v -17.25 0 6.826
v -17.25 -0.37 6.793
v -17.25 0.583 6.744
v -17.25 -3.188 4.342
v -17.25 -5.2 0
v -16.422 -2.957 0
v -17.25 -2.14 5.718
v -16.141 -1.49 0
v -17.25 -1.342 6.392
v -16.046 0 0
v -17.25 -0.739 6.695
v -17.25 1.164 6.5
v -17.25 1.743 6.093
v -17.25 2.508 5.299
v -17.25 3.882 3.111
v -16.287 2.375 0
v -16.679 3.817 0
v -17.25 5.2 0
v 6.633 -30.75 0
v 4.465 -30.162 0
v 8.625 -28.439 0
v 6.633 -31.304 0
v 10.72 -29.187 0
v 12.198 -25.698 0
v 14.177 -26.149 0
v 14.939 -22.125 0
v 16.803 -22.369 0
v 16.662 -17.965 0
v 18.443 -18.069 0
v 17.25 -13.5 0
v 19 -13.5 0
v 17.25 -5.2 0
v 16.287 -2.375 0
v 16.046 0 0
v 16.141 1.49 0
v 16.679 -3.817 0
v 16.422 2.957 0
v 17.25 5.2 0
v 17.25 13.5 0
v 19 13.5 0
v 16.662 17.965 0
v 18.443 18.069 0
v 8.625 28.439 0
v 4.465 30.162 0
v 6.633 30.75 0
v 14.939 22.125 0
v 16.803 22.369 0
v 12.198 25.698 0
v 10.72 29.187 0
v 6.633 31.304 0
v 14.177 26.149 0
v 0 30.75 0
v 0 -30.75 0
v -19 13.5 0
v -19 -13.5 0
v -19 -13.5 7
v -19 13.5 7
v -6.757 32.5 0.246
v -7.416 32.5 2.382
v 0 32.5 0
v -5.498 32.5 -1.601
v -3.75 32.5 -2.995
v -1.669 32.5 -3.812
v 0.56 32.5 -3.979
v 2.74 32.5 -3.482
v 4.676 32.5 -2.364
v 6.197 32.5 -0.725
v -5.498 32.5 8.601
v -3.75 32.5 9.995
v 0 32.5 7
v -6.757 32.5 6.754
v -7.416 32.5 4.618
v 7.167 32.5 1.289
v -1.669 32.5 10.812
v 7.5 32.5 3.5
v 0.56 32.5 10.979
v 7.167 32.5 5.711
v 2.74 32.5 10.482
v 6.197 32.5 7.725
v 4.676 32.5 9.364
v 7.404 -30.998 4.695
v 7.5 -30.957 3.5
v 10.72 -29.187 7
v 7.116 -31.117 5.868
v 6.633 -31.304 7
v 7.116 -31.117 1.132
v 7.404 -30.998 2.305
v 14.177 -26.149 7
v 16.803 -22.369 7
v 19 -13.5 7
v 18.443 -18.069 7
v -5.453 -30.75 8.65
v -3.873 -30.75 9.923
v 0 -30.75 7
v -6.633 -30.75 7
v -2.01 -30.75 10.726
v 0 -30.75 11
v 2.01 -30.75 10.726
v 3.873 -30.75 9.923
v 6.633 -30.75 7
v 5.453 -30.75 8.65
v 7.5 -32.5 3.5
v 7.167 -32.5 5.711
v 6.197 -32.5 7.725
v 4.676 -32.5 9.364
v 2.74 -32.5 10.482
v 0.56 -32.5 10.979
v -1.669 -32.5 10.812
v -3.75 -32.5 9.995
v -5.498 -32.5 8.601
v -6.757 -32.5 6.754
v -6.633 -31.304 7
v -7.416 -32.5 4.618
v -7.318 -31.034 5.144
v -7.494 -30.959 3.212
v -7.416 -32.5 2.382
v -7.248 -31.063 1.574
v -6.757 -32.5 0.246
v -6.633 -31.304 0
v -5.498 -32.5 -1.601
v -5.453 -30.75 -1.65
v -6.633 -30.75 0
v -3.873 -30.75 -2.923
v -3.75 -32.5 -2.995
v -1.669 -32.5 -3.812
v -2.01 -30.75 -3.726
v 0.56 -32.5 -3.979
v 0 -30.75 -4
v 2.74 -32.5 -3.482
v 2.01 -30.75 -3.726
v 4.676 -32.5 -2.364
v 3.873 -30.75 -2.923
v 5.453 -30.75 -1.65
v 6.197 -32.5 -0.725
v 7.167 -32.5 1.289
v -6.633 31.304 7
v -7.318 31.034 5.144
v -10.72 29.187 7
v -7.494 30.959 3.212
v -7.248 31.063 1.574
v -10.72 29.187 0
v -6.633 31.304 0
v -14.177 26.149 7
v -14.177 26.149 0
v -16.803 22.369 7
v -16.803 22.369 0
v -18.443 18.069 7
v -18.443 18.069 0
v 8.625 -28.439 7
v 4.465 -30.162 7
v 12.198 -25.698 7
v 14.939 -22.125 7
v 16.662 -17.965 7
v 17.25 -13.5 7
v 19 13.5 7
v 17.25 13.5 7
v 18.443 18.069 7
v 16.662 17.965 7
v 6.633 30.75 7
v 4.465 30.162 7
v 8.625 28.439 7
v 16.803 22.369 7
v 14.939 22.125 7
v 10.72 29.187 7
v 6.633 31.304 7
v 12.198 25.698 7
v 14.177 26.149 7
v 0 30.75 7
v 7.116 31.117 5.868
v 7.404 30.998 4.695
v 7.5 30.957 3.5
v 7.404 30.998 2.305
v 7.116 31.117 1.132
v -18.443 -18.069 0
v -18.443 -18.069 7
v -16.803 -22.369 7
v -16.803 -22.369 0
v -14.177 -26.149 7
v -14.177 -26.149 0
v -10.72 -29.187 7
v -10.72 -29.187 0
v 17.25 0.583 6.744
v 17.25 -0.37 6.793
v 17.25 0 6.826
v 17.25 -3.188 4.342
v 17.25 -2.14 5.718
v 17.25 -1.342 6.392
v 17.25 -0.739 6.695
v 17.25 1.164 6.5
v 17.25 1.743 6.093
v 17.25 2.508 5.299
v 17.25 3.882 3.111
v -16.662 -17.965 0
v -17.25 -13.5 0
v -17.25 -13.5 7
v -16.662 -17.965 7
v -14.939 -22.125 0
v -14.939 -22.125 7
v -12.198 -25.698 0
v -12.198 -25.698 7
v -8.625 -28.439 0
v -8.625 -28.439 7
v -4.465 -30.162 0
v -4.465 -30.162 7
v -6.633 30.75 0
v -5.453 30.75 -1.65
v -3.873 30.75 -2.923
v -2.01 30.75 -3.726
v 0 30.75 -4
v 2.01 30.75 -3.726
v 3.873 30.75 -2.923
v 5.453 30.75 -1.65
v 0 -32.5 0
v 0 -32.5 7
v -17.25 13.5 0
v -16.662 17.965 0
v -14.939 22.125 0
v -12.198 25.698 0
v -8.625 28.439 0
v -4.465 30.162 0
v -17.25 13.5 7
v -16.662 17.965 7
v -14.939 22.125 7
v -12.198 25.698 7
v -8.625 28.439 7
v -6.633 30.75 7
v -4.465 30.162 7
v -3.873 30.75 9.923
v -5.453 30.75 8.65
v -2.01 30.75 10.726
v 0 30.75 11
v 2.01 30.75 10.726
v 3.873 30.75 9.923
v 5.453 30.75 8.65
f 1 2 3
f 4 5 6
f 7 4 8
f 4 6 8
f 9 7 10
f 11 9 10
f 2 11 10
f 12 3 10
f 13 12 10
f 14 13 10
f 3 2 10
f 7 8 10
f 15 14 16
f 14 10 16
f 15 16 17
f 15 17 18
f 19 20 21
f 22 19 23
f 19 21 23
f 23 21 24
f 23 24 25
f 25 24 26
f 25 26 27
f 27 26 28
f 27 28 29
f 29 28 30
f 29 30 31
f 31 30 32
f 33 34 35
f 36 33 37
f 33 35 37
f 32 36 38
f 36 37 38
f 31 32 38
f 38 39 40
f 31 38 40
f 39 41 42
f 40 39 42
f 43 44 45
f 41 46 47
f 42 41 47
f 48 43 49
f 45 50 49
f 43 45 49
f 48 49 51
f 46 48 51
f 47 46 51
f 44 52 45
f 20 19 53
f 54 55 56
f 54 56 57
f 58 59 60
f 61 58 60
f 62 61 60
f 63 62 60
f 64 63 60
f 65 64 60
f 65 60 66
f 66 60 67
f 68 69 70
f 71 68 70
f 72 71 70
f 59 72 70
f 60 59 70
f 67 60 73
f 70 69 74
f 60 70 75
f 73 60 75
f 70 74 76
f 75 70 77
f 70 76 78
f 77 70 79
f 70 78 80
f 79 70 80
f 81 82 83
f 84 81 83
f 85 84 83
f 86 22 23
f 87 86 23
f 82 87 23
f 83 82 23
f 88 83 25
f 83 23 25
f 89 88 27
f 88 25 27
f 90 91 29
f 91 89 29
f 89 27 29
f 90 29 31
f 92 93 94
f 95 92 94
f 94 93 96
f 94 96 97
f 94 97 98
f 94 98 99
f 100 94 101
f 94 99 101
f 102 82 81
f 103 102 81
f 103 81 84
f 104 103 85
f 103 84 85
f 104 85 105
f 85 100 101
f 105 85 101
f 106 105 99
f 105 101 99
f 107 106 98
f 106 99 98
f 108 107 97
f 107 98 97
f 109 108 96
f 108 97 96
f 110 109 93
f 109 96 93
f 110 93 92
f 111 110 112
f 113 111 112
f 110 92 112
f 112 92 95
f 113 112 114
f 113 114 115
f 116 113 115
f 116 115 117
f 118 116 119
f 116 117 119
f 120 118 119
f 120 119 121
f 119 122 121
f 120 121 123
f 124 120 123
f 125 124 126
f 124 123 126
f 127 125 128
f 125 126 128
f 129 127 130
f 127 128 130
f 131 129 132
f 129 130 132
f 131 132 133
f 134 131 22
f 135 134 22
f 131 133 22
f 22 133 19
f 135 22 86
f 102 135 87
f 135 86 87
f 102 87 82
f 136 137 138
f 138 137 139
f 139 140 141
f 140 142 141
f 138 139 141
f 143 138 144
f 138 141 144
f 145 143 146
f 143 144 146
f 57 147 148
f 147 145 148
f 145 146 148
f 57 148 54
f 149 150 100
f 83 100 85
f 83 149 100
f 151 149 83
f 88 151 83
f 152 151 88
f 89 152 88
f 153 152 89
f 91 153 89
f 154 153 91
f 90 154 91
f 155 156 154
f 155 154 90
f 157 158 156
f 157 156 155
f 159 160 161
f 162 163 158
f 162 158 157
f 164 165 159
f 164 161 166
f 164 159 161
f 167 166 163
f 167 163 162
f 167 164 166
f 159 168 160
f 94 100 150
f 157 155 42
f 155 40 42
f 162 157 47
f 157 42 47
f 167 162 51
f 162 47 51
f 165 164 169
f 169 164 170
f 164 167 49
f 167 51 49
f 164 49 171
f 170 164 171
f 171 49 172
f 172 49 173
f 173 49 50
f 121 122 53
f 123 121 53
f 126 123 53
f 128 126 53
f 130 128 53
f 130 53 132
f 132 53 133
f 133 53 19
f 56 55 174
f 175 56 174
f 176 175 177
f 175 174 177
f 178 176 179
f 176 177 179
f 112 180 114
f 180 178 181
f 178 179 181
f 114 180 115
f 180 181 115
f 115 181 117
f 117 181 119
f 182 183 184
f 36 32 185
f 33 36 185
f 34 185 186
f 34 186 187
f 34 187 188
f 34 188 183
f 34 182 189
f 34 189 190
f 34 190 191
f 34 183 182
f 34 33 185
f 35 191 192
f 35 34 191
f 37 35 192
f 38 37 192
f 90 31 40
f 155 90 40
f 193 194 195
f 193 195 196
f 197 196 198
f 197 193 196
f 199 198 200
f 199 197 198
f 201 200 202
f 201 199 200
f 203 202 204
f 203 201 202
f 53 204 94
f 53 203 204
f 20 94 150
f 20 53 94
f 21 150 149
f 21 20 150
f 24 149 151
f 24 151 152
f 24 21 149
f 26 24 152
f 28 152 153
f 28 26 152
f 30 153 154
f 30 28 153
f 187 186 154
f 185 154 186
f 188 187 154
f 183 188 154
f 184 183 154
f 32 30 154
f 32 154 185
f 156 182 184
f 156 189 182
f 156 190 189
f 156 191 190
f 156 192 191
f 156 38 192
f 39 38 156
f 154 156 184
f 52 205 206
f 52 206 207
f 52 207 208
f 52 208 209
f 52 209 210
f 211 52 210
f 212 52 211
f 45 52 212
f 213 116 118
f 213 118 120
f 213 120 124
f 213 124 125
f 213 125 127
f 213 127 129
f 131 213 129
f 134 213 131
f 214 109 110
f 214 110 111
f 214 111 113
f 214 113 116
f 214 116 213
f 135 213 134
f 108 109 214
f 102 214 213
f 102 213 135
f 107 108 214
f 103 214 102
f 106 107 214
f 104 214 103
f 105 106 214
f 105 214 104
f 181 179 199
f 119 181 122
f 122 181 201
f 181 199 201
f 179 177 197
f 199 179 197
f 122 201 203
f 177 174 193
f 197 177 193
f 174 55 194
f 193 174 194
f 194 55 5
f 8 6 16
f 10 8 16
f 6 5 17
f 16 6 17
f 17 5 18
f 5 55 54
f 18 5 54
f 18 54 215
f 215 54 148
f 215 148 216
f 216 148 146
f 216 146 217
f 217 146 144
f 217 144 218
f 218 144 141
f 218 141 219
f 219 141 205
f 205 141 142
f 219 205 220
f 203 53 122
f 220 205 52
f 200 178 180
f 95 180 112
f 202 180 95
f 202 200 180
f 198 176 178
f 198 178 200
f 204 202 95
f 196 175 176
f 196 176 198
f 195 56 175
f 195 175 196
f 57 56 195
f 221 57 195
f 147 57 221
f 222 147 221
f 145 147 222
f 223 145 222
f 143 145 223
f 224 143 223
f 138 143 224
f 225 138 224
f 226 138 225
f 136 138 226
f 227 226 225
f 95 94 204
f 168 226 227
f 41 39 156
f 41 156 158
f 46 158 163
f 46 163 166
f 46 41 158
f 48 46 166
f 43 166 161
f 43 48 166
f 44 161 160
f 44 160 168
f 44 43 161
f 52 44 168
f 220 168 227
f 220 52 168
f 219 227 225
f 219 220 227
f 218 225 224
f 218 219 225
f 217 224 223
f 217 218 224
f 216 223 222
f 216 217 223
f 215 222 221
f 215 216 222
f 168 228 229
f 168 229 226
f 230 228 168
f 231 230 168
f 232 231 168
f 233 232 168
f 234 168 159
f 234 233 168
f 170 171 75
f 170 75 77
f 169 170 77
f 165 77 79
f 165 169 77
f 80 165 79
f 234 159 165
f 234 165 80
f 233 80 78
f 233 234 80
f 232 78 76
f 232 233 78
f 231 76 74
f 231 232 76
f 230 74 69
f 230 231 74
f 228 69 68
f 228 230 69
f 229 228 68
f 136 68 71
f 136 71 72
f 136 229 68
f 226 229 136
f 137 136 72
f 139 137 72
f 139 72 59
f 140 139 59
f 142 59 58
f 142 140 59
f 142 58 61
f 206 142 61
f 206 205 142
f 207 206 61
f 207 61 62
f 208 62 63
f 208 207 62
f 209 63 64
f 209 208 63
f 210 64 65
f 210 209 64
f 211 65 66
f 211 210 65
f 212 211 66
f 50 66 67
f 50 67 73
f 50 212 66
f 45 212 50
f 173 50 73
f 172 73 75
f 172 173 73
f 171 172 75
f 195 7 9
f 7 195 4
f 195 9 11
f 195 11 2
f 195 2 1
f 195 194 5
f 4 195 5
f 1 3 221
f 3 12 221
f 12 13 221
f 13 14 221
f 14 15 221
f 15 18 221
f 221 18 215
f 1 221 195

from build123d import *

# Parameters (mm, degrees)
CYLINDER070_R               = 80
CYLINDER070_DEPTH           = 10
CYLINDER069_R               = 80
CYLINDER069_DEPTH           = 10
BOX005_W                    = 40
BOX005_H                    = 27
BOX005_DEPTH                = 7
BOX004_W                    = 40
BOX004_H                    = 27
BOX004_DEPTH                = 7
CYLINDER071_R               = 12
CYLINDER071_DEPTH           = 10
CYLINDER071_PLACEMENT_ANGLE = 350
BOX002_W                    = 1.75
BOX002_H                    = 27
BOX002_DEPTH                = 7
CYLINDER073_R               = 17.25
CYLINDER073_DEPTH           = 7
CYLINDER067_R               = 17.25
CYLINDER067_DEPTH           = 7
BOX006_W                    = 34.5
BOX006_H                    = 27
BOX006_DEPTH                = 7
CYLINDER072_R               = 19
CYLINDER072_DEPTH           = 7
CYLINDER066_R               = 19
CYLINDER066_DEPTH           = 7
BOX003_W                    = 1.75
BOX003_H                    = 27
BOX003_DEPTH                = 7
CYLINDER076_R               = 12
CYLINDER076_DEPTH           = 10
CYLINDER076_PLACEMENT_ANGLE = 10
CYLINDER077_R               = 7.5
CYLINDER077_DEPTH           = 1.75
CYLINDER075_R               = 7.5
CYLINDER075_DEPTH           = 1.75


with BuildPart() as ncylinder002:
    # Cylinder070 → Cylinder070 (new body)
    with BuildSketch(Plane.XY.offset(-10)):
        Circle(CYLINDER070_R)
    extrude(amount=CYLINDER070_DEPTH)


with BuildPart() as ncylinder001:
    # Cylinder069 → Cylinder069 (new body)
    with BuildSketch(Plane.XY.offset(7)):
        Circle(CYLINDER069_R)
    extrude(amount=CYLINDER069_DEPTH)


with BuildPart() as cube003:
    # Box005 → Box005 (new body)
    with BuildSketch(Plane(origin=(-59, -13.5, 0), x_dir=(1, 0, 0), z_dir=(0, 0, 1))):
        with Locations((20, 13.5)):
            Rectangle(BOX005_W, BOX005_H)
    extrude(amount=BOX005_DEPTH)


with BuildPart() as nlockring:
    # Box004 → Box004 (new body)
    with BuildSketch(Plane(origin=(19, -13.5, 0), x_dir=(1, 0, 0), z_dir=(0, 0, 1))):
        with Locations((20, 13.5)):
            Rectangle(BOX004_W, BOX004_H)
    extrude(amount=BOX004_DEPTH)

    # Fusion075: union Cube003
    add(cube003.part)

    # Fusion077: union nCylinder002, nCylinder001
    add(ncylinder002.part)
    add(ncylinder001.part)


with BuildPart() as plockringtooth:
    # Cylinder071 → Cylinder071 (new body)
    with BuildSketch(Plane.XY):
        Circle(CYLINDER071_R)
    extrude(amount=CYLINDER071_DEPTH)


with BuildPart() as plockringtooth_1:
    # Cylinder071 placement: moved
    add(plockringtooth.part.moved(Location((-27.54617, 0, -3.88689))).rotate(Axis((-27.54617, 0, -3.88689), (0, 1, 0)), CYLINDER071_PLACEMENT_ANGLE))


with BuildPart() as plockringtooth2:
    # Part__Mirroring: instance of pLockRingTooth
    add(plockringtooth_1.part.mirror(Plane(origin=(0, 0, 0), x_dir=(0, -1, 0), z_dir=(1, 0, 0))))


with BuildPart() as plockringstraight1:
    # Box002 → Box002 (new body)
    with BuildSketch(Plane(origin=(17.25, -13.5, 0), x_dir=(1, 0, 0), z_dir=(0, 0, 1))):
        with Locations((0.875, 13.5)):
            Rectangle(BOX002_W, BOX002_H)
    extrude(amount=BOX002_DEPTH)


with BuildPart() as nlockcylinderlower:
    # Cylinder073 → Cylinder073 (new body)
    with BuildSketch(Plane(origin=(0, -13.5, 0), x_dir=(1, 0, 0), z_dir=(0, 0, 1))):
        Circle(CYLINDER073_R)
    extrude(amount=CYLINDER073_DEPTH)


with BuildPart() as nlockcylinderupper:
    # Cylinder067 → Cylinder067 (new body)
    with BuildSketch(Plane(origin=(0, 13.5, 0), x_dir=(1, 0, 0), z_dir=(0, 0, 1))):
        Circle(CYLINDER067_R)
    extrude(amount=CYLINDER067_DEPTH)


with BuildPart() as nlockcylinder:
    # Box006 → Box006 (new body)
    with BuildSketch(Plane(origin=(-17.25, -13.5, 0), x_dir=(1, 0, 0), z_dir=(0, 0, 1))):
        with Locations((17.25, 13.5)):
            Rectangle(BOX006_W, BOX006_H)
    extrude(amount=BOX006_DEPTH)

    # Fusion078: union nLockCylinderLower, nLockCylinderUpper
    add(nlockcylinderlower.part)
    add(nlockcylinderupper.part)


with BuildPart() as plockcylinderlower:
    # Cylinder072 → Cylinder072 (new body)
    with BuildSketch(Plane(origin=(0, -13.5, 0), x_dir=(1, 0, 0), z_dir=(0, 0, 1))):
        Circle(CYLINDER072_R)
    extrude(amount=CYLINDER072_DEPTH)


with BuildPart() as plockringtrackrounds:
    # Cylinder066 → Cylinder066 (new body)
    with BuildSketch(Plane(origin=(0, 13.5, 0), x_dir=(1, 0, 0), z_dir=(0, 0, 1))):
        Circle(CYLINDER066_R)
    extrude(amount=CYLINDER066_DEPTH)

    # Fusion079: union pLockCylinderLower
    add(plockcylinderlower.part)

    # Cut035: cut nLockCylinder
    add(nlockcylinder.part, mode=Mode.SUBTRACT)


with BuildPart() as plockringstraight2:
    # Box003 → Box003 (new body)
    with BuildSketch(Plane(origin=(-19, -13.5, 0), x_dir=(1, 0, 0), z_dir=(0, 0, 1))):
        with Locations((0.875, 13.5)):
            Rectangle(BOX003_W, BOX003_H)
    extrude(amount=BOX003_DEPTH)


with BuildPart() as lockringnofingertabs:
    # Cylinder076 → Cylinder076 (new body)
    with BuildSketch(Plane.XY):
        Circle(CYLINDER076_R)
    extrude(amount=CYLINDER076_DEPTH)


with BuildPart() as lockringnofingertabs_1:
    # Cylinder076 placement: moved
    add(lockringnofingertabs.part.moved(Location((-27.54617, 0, -3.88689))).rotate(Axis((-27.54617, 0, -3.88689), (0, -1, 0)), CYLINDER076_PLACEMENT_ANGLE))

    # Fusion080: union pLockRingTooth2, pLockRingStraight1, pLockRingTrackRounds, pLockRingStraight2
    add(plockringtooth2.part)
    add(plockringstraight1.part)
    add(plockringtrackrounds.part)
    add(plockringstraight2.part)

    # Cut036: cut nLockRing
    add(nlockring.part, mode=Mode.SUBTRACT)


with BuildPart() as fingertab1:
    # Cylinder077 → Cylinder077 (new body)
    with BuildSketch(Plane(origin=(0, -30.75, 3.5), x_dir=(1, 0, 0), z_dir=(0, -1, 0))):
        Circle(CYLINDER077_R)
    extrude(amount=CYLINDER077_DEPTH)


with BuildPart() as fingertab:
    # Cylinder075 → Cylinder075 (new body)
    with BuildSketch(Plane(origin=(0, -30.75, 3.5), x_dir=(1, 0, 0), z_dir=(0, -1, 0))):
        Circle(CYLINDER075_R)
    extrude(amount=CYLINDER075_DEPTH)


with BuildPart() as toplevelpart_lockring:
    # Part__Mirroring010: instance of FingerTab
    add(fingertab.part.mirror(Plane(origin=(0, 0, 0), x_dir=(1, 0, 0), z_dir=(0, 1, 0))))

    # Fusion081: union LockRingNoFingerTabs, FingerTab1
    add(lockringnofingertabs_1.part)
    add(fingertab1.part)


solid = toplevelpart_lockring.part
